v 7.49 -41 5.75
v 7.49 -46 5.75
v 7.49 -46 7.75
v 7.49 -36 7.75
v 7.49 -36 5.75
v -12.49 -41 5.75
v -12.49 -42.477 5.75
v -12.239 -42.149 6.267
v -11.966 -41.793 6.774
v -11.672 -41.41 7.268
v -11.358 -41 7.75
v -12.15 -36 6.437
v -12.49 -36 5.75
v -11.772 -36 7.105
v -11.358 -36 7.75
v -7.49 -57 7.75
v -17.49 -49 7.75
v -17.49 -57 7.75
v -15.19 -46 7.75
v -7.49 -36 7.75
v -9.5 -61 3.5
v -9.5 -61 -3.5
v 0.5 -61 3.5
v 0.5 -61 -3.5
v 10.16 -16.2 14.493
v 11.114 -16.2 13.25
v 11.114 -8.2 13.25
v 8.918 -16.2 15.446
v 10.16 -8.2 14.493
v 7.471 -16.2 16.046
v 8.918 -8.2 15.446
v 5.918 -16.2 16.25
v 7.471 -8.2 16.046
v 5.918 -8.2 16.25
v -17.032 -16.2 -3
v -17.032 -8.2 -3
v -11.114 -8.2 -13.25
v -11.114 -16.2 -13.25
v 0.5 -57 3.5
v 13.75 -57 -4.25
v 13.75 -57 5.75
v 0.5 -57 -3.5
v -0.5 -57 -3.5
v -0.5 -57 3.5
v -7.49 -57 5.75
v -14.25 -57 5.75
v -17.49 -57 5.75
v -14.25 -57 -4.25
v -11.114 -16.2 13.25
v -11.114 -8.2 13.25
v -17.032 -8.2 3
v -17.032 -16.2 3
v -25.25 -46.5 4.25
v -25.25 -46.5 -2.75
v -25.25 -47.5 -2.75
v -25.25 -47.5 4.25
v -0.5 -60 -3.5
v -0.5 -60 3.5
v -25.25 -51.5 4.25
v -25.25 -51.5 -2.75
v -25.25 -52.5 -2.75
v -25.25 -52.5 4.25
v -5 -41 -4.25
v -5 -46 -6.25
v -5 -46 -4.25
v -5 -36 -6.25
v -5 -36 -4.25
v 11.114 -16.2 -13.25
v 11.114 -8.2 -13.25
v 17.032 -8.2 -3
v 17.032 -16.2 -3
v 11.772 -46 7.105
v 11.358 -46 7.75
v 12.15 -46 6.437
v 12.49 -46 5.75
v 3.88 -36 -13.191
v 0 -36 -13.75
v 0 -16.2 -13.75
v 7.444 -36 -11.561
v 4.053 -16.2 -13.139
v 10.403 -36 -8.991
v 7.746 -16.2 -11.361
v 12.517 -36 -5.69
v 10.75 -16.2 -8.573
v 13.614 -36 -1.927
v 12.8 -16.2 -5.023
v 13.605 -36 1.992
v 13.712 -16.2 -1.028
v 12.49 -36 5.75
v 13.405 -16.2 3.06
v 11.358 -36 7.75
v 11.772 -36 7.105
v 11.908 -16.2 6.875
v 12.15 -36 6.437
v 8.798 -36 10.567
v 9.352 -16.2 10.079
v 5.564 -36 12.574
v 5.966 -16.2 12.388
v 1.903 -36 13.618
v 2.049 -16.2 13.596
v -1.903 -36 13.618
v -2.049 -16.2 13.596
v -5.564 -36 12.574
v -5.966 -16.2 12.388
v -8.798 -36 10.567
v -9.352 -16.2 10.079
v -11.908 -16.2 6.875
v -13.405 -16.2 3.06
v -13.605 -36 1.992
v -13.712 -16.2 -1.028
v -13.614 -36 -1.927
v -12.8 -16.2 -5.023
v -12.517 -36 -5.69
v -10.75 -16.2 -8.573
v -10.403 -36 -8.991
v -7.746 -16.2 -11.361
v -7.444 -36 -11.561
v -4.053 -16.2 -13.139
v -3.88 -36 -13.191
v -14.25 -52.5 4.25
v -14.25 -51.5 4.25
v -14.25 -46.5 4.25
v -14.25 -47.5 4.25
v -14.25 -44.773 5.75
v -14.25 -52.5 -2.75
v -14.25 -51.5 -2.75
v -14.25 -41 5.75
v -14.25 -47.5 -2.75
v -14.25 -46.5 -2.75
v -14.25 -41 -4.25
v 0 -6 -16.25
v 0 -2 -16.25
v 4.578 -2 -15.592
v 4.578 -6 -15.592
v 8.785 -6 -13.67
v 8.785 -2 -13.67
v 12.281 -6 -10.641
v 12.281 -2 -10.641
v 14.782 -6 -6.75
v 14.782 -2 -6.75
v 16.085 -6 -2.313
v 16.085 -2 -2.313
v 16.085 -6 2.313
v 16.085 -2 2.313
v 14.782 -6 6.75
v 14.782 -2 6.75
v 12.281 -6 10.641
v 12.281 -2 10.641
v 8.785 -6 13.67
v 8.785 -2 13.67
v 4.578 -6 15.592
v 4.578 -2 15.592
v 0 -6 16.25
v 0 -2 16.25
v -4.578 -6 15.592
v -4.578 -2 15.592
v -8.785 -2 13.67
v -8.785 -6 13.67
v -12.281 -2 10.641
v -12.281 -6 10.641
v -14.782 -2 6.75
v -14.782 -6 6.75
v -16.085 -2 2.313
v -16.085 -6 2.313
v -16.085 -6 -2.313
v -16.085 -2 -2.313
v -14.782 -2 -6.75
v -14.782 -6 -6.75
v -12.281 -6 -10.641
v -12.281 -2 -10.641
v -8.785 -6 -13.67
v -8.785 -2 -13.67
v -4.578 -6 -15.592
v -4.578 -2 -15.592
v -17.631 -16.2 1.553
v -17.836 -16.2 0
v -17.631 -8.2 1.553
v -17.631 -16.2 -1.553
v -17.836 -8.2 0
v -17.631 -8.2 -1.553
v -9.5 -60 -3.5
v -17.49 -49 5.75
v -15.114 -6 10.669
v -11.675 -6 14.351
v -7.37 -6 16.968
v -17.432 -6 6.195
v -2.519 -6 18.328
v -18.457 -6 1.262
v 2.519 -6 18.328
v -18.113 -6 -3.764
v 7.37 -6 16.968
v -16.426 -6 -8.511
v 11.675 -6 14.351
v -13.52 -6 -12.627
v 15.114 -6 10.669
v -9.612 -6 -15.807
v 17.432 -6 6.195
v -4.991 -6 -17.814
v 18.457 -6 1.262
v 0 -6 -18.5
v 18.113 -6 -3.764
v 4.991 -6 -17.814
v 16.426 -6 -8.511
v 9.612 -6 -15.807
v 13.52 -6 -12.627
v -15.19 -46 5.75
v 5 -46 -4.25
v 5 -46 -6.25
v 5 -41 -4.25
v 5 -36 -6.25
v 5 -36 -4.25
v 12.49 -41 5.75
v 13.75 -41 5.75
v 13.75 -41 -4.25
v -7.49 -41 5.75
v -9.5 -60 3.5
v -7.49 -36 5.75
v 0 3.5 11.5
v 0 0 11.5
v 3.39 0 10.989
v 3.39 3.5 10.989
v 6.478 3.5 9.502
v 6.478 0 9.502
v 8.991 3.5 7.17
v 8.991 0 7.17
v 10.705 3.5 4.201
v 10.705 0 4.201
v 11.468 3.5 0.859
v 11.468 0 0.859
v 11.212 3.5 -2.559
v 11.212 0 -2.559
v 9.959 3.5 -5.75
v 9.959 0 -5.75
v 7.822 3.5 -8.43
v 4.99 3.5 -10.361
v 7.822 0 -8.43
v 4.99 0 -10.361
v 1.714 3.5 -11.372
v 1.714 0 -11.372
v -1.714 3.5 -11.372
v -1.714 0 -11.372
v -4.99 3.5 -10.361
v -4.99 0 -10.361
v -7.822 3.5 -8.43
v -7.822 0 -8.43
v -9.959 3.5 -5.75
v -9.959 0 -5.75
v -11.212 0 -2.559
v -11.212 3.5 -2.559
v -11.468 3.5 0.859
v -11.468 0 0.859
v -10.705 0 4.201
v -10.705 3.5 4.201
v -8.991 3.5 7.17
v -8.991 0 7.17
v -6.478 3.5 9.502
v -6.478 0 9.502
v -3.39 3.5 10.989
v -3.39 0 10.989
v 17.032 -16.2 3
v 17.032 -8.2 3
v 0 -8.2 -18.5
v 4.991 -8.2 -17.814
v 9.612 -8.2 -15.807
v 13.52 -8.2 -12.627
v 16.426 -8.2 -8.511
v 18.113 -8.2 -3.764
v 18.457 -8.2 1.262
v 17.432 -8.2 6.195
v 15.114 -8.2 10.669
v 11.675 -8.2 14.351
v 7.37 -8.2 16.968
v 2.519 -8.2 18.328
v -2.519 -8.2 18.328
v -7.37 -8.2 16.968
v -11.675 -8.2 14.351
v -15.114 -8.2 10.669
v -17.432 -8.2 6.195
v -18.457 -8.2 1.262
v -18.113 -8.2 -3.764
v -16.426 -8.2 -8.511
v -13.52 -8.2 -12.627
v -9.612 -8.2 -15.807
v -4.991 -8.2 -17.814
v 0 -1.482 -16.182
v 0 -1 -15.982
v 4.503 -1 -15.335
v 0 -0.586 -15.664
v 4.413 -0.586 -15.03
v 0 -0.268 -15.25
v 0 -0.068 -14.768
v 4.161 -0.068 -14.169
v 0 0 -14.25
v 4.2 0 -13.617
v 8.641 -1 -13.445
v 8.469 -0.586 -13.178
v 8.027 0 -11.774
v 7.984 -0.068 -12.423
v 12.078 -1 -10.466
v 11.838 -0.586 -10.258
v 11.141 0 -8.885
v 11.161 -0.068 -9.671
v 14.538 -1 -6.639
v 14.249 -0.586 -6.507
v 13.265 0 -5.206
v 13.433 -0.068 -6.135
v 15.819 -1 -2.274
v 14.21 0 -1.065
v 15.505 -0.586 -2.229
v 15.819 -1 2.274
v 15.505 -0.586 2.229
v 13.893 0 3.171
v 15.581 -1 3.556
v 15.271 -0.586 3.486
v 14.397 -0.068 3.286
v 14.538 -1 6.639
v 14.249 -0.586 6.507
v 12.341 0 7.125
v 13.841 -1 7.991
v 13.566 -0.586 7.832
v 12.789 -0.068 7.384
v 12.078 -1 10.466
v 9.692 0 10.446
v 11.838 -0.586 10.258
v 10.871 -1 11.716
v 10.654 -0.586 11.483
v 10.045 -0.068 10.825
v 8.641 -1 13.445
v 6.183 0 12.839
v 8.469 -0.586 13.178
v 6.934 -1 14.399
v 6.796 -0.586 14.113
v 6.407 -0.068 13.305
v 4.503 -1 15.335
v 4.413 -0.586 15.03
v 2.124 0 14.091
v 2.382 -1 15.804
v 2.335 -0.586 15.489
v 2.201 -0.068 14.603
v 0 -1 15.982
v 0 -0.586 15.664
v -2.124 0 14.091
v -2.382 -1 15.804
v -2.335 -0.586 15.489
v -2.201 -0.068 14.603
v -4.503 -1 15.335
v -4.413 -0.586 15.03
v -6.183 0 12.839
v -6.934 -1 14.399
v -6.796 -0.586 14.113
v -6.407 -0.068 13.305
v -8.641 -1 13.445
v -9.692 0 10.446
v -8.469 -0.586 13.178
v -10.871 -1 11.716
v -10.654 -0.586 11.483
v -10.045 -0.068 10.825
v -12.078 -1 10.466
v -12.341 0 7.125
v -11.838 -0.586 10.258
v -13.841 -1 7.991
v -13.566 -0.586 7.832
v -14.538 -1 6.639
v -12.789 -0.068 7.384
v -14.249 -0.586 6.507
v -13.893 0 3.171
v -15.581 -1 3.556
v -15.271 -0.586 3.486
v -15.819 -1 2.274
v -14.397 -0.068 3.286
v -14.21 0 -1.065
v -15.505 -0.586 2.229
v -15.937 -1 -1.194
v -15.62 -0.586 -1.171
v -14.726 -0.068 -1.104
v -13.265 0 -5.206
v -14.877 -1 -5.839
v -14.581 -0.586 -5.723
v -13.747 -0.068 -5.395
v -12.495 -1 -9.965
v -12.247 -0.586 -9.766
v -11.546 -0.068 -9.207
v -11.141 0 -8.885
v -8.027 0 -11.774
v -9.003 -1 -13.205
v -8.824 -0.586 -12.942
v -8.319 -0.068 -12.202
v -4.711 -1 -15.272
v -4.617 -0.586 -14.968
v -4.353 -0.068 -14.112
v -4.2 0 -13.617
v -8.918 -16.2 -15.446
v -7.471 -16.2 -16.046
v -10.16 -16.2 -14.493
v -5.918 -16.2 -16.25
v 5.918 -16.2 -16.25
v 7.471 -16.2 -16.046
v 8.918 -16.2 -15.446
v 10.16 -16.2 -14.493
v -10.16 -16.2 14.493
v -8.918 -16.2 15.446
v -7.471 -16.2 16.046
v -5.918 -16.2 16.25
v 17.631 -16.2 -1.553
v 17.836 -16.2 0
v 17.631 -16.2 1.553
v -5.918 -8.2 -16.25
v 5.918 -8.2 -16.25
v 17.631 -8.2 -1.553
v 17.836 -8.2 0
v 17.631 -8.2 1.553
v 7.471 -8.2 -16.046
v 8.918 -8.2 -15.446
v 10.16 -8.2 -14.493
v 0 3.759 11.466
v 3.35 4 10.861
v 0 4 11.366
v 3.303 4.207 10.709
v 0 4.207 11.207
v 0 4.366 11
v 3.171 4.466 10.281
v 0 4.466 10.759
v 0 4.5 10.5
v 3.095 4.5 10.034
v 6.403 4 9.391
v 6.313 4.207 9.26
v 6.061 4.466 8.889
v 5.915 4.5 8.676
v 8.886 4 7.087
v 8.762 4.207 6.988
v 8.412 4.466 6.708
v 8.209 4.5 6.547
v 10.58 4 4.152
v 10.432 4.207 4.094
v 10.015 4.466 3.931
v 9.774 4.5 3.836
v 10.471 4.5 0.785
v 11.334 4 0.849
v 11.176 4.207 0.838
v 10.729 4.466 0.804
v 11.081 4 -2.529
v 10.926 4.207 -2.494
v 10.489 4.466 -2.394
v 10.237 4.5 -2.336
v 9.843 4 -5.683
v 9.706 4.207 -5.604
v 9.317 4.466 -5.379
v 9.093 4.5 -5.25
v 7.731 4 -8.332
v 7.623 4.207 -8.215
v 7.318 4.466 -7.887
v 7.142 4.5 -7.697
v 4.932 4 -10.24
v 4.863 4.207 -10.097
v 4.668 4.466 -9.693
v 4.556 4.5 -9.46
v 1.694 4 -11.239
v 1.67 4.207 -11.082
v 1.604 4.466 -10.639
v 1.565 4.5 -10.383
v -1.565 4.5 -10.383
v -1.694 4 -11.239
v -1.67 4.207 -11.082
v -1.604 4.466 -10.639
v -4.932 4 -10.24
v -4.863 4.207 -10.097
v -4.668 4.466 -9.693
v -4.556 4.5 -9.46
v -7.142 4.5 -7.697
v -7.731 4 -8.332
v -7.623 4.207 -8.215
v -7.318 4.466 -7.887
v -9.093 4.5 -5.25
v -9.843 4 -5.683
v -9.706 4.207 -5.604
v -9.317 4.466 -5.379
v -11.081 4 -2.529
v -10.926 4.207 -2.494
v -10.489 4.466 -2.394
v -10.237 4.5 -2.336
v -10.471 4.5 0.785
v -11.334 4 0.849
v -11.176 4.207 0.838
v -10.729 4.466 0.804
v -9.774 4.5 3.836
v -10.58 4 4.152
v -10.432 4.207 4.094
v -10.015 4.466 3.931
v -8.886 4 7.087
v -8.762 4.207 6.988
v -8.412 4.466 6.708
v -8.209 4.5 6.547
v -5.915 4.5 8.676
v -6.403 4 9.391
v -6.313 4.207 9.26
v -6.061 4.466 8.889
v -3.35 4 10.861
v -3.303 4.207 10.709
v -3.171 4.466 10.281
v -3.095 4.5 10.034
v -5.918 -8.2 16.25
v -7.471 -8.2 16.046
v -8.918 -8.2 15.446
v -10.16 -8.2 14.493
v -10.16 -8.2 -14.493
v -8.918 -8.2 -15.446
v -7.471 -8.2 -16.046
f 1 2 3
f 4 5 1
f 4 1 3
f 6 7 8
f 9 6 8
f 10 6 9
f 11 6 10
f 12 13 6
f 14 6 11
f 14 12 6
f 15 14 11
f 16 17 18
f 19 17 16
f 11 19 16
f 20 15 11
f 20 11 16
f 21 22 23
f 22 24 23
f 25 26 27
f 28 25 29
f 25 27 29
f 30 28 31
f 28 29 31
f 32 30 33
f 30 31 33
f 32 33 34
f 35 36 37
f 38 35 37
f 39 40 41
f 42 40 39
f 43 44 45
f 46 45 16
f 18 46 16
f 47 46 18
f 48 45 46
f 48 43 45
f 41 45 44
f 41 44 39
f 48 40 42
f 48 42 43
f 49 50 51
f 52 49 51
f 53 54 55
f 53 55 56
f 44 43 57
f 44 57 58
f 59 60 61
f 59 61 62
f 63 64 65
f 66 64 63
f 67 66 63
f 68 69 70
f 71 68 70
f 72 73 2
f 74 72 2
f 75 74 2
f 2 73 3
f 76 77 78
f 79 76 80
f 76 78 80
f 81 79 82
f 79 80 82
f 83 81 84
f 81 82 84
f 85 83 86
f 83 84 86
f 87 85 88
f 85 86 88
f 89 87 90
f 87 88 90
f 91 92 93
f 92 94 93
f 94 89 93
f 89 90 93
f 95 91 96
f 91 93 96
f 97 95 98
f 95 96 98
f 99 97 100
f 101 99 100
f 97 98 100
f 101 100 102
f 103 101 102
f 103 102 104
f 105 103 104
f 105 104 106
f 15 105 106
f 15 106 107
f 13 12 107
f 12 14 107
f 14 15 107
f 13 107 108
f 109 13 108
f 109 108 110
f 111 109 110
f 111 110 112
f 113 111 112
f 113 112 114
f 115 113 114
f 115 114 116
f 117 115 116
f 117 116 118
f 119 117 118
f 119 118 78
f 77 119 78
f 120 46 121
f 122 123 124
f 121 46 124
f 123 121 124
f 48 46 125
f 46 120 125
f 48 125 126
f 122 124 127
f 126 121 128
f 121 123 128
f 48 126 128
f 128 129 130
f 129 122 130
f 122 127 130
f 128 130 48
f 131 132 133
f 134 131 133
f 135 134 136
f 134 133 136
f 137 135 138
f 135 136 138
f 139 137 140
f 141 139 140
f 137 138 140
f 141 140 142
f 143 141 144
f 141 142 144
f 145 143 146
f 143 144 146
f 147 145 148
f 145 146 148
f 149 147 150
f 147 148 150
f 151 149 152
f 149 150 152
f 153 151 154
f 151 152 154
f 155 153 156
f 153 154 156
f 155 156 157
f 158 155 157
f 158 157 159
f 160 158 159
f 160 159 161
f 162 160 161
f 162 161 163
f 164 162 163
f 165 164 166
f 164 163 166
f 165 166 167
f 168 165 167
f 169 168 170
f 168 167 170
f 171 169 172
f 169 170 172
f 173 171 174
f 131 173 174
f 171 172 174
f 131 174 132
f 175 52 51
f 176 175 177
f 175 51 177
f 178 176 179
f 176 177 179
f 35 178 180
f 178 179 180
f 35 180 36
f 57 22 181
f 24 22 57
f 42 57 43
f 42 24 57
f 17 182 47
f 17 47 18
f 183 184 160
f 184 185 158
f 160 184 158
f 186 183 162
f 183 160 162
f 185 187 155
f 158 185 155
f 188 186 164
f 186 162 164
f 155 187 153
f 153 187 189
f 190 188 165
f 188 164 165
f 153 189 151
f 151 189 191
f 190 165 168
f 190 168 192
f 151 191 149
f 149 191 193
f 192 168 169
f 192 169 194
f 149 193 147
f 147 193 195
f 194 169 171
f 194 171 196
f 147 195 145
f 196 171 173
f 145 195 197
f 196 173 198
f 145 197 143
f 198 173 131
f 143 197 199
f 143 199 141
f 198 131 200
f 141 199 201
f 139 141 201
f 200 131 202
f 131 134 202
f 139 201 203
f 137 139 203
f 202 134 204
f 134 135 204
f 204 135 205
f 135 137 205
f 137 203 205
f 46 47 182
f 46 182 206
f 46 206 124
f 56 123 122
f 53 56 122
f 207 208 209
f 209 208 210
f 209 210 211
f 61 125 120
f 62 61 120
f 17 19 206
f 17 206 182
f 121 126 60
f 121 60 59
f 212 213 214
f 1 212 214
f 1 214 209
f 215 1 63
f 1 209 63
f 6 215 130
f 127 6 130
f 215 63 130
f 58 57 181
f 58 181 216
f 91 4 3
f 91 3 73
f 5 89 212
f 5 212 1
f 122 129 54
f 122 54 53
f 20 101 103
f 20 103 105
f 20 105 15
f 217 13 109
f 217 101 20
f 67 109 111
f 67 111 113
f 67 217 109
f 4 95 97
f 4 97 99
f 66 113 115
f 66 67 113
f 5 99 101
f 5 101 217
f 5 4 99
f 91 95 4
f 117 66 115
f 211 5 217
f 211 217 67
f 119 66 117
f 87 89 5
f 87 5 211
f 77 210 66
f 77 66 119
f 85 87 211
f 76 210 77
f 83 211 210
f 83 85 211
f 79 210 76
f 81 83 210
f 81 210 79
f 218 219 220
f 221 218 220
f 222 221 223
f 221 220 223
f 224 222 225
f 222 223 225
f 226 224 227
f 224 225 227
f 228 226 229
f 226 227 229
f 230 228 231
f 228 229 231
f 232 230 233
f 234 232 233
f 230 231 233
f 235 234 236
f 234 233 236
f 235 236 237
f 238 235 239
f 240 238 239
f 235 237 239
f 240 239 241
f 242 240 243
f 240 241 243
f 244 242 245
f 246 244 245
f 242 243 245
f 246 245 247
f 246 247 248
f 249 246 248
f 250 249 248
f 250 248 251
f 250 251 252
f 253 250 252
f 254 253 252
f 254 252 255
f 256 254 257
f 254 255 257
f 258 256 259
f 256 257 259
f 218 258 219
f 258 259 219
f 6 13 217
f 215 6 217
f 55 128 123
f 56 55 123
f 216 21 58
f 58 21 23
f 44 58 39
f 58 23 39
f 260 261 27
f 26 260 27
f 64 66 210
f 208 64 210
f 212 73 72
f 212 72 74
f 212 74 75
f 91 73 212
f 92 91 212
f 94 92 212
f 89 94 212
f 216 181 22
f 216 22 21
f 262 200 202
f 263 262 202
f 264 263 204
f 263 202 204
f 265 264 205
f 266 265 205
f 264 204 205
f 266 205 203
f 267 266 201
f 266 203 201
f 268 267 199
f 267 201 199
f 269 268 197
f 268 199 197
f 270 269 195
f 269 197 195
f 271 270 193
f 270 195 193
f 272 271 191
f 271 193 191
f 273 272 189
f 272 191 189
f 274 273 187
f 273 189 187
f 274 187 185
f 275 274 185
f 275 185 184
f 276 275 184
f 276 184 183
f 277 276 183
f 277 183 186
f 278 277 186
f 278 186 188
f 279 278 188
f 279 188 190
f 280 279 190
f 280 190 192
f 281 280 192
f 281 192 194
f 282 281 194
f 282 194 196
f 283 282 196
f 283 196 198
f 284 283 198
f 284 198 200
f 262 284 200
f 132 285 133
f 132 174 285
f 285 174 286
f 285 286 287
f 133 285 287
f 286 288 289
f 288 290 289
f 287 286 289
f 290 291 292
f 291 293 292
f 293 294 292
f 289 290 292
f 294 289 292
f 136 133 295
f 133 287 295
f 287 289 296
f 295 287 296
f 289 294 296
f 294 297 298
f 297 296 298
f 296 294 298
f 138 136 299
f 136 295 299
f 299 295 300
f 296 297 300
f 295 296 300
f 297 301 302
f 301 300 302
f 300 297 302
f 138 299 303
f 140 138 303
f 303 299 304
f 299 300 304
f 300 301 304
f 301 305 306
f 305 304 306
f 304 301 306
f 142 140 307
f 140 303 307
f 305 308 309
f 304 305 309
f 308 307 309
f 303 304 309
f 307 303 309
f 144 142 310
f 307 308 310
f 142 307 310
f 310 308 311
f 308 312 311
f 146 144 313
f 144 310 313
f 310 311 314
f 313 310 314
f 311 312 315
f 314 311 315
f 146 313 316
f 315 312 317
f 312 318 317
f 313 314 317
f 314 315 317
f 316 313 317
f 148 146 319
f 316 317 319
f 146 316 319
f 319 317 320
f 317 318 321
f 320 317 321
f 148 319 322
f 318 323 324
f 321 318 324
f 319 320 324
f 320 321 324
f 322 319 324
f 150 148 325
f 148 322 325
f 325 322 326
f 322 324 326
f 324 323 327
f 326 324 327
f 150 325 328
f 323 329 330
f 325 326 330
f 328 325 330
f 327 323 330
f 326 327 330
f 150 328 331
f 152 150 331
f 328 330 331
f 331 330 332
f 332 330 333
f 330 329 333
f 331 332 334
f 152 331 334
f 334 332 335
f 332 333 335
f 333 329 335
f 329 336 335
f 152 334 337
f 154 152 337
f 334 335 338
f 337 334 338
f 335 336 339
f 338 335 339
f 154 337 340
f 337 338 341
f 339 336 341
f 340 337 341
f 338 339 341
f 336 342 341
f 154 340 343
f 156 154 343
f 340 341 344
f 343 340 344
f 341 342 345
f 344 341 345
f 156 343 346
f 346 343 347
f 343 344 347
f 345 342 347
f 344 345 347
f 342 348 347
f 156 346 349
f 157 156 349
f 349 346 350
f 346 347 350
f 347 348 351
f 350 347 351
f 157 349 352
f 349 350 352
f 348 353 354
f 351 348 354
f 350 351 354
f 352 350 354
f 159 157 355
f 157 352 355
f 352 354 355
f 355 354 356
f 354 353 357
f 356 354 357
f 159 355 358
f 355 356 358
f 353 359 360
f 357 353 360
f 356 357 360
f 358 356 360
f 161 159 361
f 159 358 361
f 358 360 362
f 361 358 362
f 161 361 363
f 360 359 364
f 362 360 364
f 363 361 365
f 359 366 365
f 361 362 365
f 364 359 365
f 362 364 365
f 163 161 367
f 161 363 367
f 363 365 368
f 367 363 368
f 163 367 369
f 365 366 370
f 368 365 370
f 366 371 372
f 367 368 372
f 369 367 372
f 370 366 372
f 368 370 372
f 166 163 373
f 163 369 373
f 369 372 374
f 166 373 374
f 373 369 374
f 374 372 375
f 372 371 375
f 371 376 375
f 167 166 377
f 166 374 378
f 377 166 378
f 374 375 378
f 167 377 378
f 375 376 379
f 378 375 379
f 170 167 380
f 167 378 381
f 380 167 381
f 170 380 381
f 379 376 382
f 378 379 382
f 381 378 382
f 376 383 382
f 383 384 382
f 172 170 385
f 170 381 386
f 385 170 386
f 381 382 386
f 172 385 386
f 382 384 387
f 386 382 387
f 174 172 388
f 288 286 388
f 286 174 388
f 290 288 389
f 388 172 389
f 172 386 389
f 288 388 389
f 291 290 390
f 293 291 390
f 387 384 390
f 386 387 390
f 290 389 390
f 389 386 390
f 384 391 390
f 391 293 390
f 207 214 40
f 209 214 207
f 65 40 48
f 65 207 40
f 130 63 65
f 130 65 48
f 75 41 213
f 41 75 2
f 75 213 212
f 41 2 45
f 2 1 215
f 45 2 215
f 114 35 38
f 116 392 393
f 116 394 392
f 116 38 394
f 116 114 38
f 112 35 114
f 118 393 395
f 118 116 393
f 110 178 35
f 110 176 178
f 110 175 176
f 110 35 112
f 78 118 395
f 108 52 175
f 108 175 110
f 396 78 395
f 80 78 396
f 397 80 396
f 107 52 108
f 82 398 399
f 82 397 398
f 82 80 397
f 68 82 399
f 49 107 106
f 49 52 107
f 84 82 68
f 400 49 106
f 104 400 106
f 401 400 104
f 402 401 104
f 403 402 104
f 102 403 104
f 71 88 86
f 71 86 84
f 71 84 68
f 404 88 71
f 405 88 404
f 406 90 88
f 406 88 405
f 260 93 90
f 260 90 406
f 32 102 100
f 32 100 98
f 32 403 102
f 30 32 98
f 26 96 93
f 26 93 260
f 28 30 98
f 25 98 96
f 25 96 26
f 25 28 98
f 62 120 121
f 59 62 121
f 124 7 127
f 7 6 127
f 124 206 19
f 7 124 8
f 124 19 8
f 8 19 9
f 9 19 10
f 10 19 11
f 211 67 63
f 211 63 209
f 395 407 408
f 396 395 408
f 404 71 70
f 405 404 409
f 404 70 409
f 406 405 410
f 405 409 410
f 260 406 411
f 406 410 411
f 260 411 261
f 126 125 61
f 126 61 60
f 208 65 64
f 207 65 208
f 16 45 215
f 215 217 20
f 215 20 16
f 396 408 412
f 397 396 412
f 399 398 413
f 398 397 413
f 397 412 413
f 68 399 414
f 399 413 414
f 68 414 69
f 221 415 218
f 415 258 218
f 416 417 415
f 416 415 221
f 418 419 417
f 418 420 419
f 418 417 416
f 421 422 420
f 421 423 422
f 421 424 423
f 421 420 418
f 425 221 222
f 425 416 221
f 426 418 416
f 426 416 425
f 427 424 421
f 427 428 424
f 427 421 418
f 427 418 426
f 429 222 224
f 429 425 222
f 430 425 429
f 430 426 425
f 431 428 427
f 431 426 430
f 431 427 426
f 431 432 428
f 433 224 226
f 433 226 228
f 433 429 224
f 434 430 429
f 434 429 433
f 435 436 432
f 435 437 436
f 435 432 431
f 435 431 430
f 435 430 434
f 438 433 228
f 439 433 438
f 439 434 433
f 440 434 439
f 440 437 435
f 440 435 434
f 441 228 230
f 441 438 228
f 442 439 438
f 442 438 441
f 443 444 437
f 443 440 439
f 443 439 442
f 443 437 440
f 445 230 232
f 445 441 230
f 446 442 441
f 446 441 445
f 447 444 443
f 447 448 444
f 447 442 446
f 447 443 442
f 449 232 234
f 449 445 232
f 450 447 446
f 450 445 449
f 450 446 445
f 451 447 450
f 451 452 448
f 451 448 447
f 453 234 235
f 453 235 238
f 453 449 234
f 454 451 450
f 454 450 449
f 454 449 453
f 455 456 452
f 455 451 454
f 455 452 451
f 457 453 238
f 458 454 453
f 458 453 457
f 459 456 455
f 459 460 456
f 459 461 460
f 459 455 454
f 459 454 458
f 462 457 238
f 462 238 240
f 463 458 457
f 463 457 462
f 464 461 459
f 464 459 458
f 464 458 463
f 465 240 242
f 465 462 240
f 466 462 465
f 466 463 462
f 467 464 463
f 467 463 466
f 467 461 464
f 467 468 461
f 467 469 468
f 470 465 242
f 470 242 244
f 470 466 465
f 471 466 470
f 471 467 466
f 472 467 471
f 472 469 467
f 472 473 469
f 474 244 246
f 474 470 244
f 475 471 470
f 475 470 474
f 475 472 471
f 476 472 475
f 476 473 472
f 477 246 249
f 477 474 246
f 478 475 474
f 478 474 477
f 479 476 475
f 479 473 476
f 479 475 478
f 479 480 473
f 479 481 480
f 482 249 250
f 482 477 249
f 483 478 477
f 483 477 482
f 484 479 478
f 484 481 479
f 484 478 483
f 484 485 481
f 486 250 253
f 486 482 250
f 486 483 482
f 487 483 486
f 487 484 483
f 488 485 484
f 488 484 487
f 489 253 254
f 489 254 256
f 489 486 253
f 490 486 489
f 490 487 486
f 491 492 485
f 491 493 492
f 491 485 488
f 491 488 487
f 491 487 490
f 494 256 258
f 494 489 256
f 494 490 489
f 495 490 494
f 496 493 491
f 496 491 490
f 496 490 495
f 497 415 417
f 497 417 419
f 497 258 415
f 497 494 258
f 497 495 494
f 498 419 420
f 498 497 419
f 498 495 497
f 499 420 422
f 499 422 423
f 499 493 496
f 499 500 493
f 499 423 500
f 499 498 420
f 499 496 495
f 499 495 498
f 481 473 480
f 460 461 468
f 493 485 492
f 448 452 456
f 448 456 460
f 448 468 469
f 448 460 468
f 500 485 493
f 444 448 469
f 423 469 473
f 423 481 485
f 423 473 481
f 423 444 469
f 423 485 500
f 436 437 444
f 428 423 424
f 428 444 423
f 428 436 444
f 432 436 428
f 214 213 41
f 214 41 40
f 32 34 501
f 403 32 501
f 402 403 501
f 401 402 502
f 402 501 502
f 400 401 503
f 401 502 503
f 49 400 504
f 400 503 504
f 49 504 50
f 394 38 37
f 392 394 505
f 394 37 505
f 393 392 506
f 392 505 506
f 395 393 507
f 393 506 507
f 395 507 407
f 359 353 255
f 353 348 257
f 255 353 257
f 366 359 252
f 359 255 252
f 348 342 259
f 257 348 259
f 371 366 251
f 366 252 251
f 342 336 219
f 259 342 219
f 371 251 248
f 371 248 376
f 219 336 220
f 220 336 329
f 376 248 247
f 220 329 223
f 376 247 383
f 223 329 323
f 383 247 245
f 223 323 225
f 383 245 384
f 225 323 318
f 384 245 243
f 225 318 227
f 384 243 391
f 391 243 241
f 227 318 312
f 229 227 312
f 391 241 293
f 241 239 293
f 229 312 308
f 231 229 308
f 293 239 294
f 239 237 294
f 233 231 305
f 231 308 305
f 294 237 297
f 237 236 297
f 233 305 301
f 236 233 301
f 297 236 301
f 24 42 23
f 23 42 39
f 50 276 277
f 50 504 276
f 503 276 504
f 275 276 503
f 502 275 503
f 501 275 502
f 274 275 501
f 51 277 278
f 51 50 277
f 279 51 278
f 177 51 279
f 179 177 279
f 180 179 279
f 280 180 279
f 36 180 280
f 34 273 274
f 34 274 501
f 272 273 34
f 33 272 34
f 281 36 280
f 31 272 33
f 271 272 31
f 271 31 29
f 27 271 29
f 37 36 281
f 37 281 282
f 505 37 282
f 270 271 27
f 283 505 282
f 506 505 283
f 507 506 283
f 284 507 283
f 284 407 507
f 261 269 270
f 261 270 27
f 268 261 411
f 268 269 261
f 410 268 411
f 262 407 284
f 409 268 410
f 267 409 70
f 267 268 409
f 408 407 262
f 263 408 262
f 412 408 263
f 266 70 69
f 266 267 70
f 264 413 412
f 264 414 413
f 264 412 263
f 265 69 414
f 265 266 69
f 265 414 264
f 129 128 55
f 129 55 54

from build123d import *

# Parameters (mm, degrees)
CROQUIS1_R               = 11.5
SALIENTE_EXTRUIR1_DEPTH  = 4.5
REDONDEO1_R              = 1
CROQUIS2_R               = 16.25
SALIENTE_EXTRUIR2_DEPTH  = 6
REDONDEO2_R              = 2
CROQUIS3_R               = 13.75
SALIENTE_EXTRUIR3_DEPTH  = 30
CROQUIS5_R               = 18.5
SALIENTE_EXTRUIR4_DEPTH  = 2.2
SALIENTE_EXTRUIR5_DEPTH  = 8
REDONDEO3_R              = 6
CROQUIS7_W               = 10
CROQUIS7_H               = 2
SALIENTE_EXTRUIR6_DEPTH  = 10
CROQUIS8_W               = 10
CROQUIS8_H               = 2
SALIENTE_EXTRUIR7_DEPTH  = 11
SALIENTE_EXTRUIR8_DEPTH  = 2
CORTAR_EXTRUIR1_DEPTH    = 66.424097243
CROQUIS12_W              = 28
CROQUIS12_H              = 10
SALIENTE_EXTRUIR9_DEPTH  = 16
CROQUIS13_W              = 1
CROQUIS13_H              = 7
SALIENTE_EXTRUIR10_DEPTH = 4
CROQUIS14_W              = 7
CROQUIS14_H              = 1
SALIENTE_EXTRUIR11_DEPTH = 9
CROQUIS15_W              = 7
CROQUIS15_H              = 1
SALIENTE_EXTRUIR12_DEPTH = 11


with BuildPart() as part:
    # Croquis1 → Saliente-Extruir1 (new body)
    with BuildSketch(Plane(origin=(0, 0, 0), x_dir=(1, 0, 0), z_dir=(0, 1, 0))):
        with Locations(Location((0, 0, 0), (0, 0, 270))):
            Circle(CROQUIS1_R)
    extrude(amount=SALIENTE_EXTRUIR1_DEPTH)

    # Redondeo1
    redondeo1_edges = [part.edges().sort_by_distance(p)[0] for p in [
        (0, 4.5, -11.5),
    ]]
    fillet(redondeo1_edges, radius=REDONDEO1_R)

    # Croquis2 → Saliente-Extruir2 (add)
    with BuildSketch(Plane.XZ):
        with Locations(Location((0, 0, 0), (0, 0, 270))):
            Circle(CROQUIS2_R)
    extrude(amount=SALIENTE_EXTRUIR2_DEPTH)

    # Redondeo2
    redondeo2_edges = [part.edges().sort_by_distance(p)[0] for p in [
        (0, 0, 16.25),
    ]]
    fillet(redondeo2_edges, radius=REDONDEO2_R)

    # Croquis3 → Saliente-Extruir3 (add)
    with BuildSketch(Plane.XZ.offset(6)):
        with Locations(Location((0, 0, 0), (0, 0, 270))):
            Circle(CROQUIS3_R)
    extrude(amount=SALIENTE_EXTRUIR3_DEPTH)

    # Croquis5 → Saliente-Extruir4 (add)
    with BuildSketch(Plane.XZ.offset(6)):
        with Locations(Location((0, 0, 0), (0, 0, 270))):
            Circle(CROQUIS5_R)
    extrude(amount=SALIENTE_EXTRUIR4_DEPTH)

    # Croquis6 → Saliente-Extruir5 (add)
    with BuildSketch(Plane.XZ.offset(8.2)):
        Polygon((18.763883749, 0), (9.381941874, 16.25), (-9.381941874, 16.25), (-18.763883749, 0), (-9.381941874, -16.25), (9.381941874, -16.25), align=None)
    extrude(amount=SALIENTE_EXTRUIR5_DEPTH)

    # Redondeo3
    # the kernel refuses this fillet: 6 mm, written as the material it takes off along each edge
    with BuildSketch(Plane(origin=(9.381941874, -8.2, -16.25), x_dir=(-1, 0, 0), z_dir=(0, -1, 0))) as redondeo3_piece_1:
        with BuildLine():
            CenterArc((REDONDEO3_R * 0.57735026919, -REDONDEO3_R), REDONDEO3_R, 90, 60)
            Line((-REDONDEO3_R * 0.288675134595, -REDONDEO3_R * 0.5), (0, 0))
            Line((0, 0), (REDONDEO3_R * 0.57735026919, 0))
        make_face()
    extrude(amount=16.660254038, mode=Mode.SUBTRACT)
    with BuildSketch(Plane(origin=(18.763883749, -8.2, 0), x_dir=(-0.4999999999999997, 0, 0.8660254037844387), z_dir=(0, -1, 0)), Plane(origin=(9.381941874, -8.2, 16.25), x_dir=(-1, 0, 0), z_dir=(0, -1, 0)), Plane(origin=(-9.381941874, -8.2, 16.25), x_dir=(-0.5, 0, -0.8660254037844386), z_dir=(0, -1, 0)), Plane(origin=(-18.763883749, -8.2, 0), x_dir=(0.4999999999999992, 0, -0.866025403784439), z_dir=(0, -1, 0)), Plane(origin=(-9.381941874, -8.2, -16.25), x_dir=(1, 0, 0), z_dir=(0, -1, 0))) as redondeo3_piece_2:
        with BuildLine():
            CenterArc((REDONDEO3_R * 0.57735026919, REDONDEO3_R), REDONDEO3_R, 210, 60)
            Line((-REDONDEO3_R * 0.288675134595, REDONDEO3_R * 0.5), (0, 0))
            Line((0, 0), (REDONDEO3_R * 0.57735026919, 0))
        make_face()
    extrude(amount=16.660254038, mode=Mode.SUBTRACT)

    # Croquis7 → Saliente-Extruir6 (add)
    with BuildSketch(Plane.XZ.offset(36)):
        with BuildLine():
            Line((-7.489995997, 5.75), (-12.489995997, 5.75))
            ThreePointArc((-12.489995997, 5.75), (-11.965765437, 6.773696), (-11.357816692, 7.75))
            Line((-11.357816692, 7.75), (-7.489995997, 7.75))
            Line((-7.489995997, 7.75), (-7.489995997, 5.75))
        make_face()
        with BuildLine():
            Line((7.489995997, 7.75), (11.357816692, 7.75))
            ThreePointArc((11.357816692, 7.75), (11.965765437, 6.773696), (12.489995997, 5.75))
            Line((12.489995997, 5.75), (7.489995997, 5.75))
            Line((7.489995997, 5.75), (7.489995997, 7.75))
        make_face()
        with Locations((0, -5.25)):
            Rectangle(CROQUIS7_W, CROQUIS7_H)
    extrude(amount=SALIENTE_EXTRUIR6_DEPTH)

    # Croquis8 → Saliente-Extruir7 (add)
    with BuildSketch(Plane.XZ.offset(46)):
        with Locations((-12.489995997, 6.75)):
            Rectangle(CROQUIS8_W, CROQUIS8_H)
    extrude(amount=SALIENTE_EXTRUIR7_DEPTH)

    # Croquis9 → Saliente-Extruir8 (add)
    with BuildSketch(Plane.XY.offset(7.75)):
        Polygon((-17.489995997, -49), (-11.357816692, -41), (-11.357816692, -49), align=None)
    extrude(amount=-SALIENTE_EXTRUIR8_DEPTH)

    # Croquis11 → Cortar-Extruir1 (cut, through all)
    with BuildSketch(Plane.XY.offset(7.75)):
        Polygon((-15.190428757, -46), (-17.489995997, -49), (-17.489995997, -46), align=None)
    extrude(amount=-CORTAR_EXTRUIR1_DEPTH, mode=Mode.SUBTRACT)

    # Croquis12 → Saliente-Extruir9 (add)
    with BuildSketch(Plane(origin=(0, -41, 0), x_dir=(-1, 0, 0), z_dir=(0, -1, 0))):
        with Locations((0.25, -0.75)):
            Rectangle(CROQUIS12_W, CROQUIS12_H)
    extrude(amount=SALIENTE_EXTRUIR9_DEPTH)

    # Croquis13 → Saliente-Extruir10 (add)
    with BuildSketch(Plane.XZ.offset(57)):
        Rectangle(CROQUIS13_W, CROQUIS13_H)
    extrude(amount=SALIENTE_EXTRUIR10_DEPTH)

    # Croquis14 → Saliente-Extruir11 (add)
    with BuildSketch(Plane.ZY.offset(0.5)):
        with Locations((0, -60.5)):
            Rectangle(CROQUIS14_W, CROQUIS14_H)
    extrude(amount=SALIENTE_EXTRUIR11_DEPTH)

    # Croquis15 → Saliente-Extruir12 (add)
    with BuildSketch(Plane.ZY.offset(14.25)):
        with Locations((0.75, -47)):
            Rectangle(CROQUIS15_W, CROQUIS15_H)
        with Locations((0.75, -52)):
            Rectangle(CROQUIS15_W, CROQUIS15_H)
    extrude(amount=SALIENTE_EXTRUIR12_DEPTH)


solid = part.part
